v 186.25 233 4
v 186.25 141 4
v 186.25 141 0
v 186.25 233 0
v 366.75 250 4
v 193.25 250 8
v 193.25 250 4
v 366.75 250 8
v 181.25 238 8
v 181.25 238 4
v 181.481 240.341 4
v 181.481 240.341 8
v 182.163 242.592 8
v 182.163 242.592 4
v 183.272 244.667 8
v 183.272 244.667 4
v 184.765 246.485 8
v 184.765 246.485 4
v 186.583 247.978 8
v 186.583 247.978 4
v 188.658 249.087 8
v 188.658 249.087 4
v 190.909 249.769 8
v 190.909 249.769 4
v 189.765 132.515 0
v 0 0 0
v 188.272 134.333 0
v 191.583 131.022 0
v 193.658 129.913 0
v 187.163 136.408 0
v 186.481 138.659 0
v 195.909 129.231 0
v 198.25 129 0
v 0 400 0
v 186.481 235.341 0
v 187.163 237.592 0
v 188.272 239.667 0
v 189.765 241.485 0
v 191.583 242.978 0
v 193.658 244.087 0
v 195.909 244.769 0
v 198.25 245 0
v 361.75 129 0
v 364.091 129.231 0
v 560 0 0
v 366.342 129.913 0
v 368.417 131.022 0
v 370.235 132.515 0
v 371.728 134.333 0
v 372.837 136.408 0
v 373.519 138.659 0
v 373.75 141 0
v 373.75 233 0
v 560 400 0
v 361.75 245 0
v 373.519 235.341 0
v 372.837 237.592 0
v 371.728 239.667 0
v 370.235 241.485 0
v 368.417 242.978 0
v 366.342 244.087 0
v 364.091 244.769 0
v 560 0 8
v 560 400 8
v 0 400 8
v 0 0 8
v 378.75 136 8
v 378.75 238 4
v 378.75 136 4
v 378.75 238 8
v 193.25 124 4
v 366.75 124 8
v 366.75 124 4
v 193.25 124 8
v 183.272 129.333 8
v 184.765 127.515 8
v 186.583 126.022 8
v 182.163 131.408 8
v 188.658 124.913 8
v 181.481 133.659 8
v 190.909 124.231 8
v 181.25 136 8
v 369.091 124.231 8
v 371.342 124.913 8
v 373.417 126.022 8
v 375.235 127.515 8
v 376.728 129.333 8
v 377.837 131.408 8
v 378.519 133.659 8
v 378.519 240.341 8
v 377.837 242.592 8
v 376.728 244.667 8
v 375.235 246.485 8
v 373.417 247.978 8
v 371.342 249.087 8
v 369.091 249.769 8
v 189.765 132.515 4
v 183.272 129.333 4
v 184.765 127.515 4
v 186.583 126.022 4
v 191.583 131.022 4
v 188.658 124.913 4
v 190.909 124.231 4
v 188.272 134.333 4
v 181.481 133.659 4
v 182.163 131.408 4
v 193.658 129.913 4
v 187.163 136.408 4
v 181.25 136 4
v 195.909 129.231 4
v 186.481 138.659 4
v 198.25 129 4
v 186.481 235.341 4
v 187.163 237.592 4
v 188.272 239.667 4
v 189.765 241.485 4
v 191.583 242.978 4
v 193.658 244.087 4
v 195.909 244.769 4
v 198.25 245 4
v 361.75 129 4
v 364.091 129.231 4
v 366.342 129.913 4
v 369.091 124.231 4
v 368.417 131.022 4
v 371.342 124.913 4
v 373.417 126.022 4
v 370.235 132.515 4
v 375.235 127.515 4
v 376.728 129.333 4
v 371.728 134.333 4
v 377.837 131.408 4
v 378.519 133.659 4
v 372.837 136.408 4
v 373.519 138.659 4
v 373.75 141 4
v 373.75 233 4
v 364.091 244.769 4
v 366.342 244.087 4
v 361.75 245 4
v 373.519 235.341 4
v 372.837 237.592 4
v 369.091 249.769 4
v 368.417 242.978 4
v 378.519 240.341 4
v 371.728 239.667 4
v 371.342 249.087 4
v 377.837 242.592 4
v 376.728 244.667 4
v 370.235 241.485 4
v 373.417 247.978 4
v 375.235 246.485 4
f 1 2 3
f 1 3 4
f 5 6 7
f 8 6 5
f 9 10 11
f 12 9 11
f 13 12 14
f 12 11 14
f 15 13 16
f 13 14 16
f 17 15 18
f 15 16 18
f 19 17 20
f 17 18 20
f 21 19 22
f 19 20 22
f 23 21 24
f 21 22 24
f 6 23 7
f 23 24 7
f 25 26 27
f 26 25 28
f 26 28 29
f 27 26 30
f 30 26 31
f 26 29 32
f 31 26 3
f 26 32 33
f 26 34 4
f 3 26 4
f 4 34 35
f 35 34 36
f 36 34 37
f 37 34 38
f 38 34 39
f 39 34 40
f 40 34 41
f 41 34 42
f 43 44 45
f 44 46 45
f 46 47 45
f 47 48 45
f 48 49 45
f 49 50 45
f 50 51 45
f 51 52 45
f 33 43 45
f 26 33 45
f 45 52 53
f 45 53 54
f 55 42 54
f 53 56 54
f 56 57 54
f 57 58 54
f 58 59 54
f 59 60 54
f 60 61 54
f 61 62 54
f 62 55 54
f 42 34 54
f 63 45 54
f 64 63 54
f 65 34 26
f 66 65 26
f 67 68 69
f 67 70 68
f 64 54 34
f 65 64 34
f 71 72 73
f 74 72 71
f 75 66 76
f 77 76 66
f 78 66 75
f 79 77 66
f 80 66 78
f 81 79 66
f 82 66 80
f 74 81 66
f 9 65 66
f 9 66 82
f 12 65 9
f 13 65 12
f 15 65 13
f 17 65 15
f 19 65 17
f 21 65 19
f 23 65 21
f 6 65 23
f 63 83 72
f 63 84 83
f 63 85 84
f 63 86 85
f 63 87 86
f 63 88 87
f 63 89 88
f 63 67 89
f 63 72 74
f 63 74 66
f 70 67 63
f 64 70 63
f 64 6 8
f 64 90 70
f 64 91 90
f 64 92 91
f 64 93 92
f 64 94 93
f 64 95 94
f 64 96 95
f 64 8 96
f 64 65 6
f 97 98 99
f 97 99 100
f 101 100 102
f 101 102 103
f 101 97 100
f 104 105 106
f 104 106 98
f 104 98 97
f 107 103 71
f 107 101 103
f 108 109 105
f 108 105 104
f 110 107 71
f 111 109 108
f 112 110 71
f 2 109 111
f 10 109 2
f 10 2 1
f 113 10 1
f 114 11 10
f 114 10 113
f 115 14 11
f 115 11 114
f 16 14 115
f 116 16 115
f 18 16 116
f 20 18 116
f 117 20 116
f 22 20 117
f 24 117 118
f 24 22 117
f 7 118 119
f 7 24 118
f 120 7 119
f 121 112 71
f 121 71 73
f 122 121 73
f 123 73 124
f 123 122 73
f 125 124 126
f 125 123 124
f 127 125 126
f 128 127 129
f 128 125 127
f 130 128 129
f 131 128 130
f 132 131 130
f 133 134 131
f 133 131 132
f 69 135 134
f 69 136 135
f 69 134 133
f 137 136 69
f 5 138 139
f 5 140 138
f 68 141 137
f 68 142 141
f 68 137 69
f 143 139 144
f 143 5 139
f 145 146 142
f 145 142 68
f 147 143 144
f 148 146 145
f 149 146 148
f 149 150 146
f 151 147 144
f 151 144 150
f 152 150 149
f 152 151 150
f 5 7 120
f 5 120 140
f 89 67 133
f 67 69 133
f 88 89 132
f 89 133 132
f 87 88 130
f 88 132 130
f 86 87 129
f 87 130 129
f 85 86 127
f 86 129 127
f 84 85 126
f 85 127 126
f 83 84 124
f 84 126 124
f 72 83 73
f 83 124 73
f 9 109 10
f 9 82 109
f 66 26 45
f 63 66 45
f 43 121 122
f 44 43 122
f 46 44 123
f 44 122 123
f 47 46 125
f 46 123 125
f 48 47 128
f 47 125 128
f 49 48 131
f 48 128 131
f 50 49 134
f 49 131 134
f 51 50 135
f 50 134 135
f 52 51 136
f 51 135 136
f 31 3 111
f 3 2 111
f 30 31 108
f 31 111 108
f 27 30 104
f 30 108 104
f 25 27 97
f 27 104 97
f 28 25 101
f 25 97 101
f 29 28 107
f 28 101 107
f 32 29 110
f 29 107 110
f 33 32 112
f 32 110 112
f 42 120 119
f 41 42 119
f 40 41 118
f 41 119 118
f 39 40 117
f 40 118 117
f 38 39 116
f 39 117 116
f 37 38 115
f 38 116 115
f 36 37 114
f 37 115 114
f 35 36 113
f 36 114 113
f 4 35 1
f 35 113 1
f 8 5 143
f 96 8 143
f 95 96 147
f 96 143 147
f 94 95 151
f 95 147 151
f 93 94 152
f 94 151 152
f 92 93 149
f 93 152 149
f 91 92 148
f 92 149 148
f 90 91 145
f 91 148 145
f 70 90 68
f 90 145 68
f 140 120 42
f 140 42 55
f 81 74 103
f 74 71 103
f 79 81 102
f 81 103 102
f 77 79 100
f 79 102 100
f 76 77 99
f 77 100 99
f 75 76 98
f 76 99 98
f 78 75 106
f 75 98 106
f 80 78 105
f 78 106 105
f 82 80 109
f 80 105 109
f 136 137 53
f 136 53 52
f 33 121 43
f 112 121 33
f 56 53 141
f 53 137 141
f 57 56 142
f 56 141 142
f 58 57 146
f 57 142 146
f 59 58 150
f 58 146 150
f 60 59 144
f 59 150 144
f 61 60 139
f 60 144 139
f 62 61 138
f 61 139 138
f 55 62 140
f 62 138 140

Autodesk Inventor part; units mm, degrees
ref_plane "YZ Plane" through (0, 0, 0) normal (1, 0, 0) x (0, 1, 0)
ref_plane "XZ Plane" through (0, 0, 0) normal (0, 1, 0) x (-1, 0, 0)
ref_plane "XY Plane" through (0, 0, 0) normal (0, 0, 1) x (1, 0, 0)
sketch "Sketch1" plane through (0, 0, 0) normal (0, 0, 1) x (1, 0, 0)
  line L0 (0, 0) -> (560, 0)
  line L1 (560, 0) -> (560, 400)
  line L2 (560, 400) -> (0, 400)
  line L3 (0, 400) -> (0, 0)
  dimension "d0" = 560
  dimension "d1" = 400
extrude "Extrusion1" add sketch "Sketch1" along normal blind 8
sketch "Sketch2" plane through (0, 0, 8) normal (0, 0, 1) x (1, 0, 0)
  line L0 (181.25, 250) -> (378.75, 250)
  line L1 (378.75, 250) -> (378.75, 124)
  line L2 (378.75, 124) -> (181.25, 124)
  line L3 (181.25, 124) -> (181.25, 250)
  line L4 (0, 400) -> (0, 0) projected
  line L5 (560, 400) -> (0, 400) projected
  line L6 (186.25, 245) -> (373.75, 245)
  line L7 (373.75, 245) -> (373.75, 129)
  line L8 (373.75, 129) -> (186.25, 129)
  line L9 (186.25, 129) -> (186.25, 245)
  dimension "cuva_width" = 197.5
  dimension "d5" = 126
  dimension "d6" = 181.25
  dimension "d7" = 150
  dimension "d8" = 5
  dimension "d9" = 5
  dimension "d10" = 5
  dimension "d11" = 5
extrude "Extrusion2" cut sketch "Sketch2" against normal blind 4
fillet "Fillet1" radius 12 4 edges at (181.25, 250, 6) (181.25, 124, 6) (378.75, 124, 6) (378.75, 250, 6)
sketch "Sketch3" plane through (0, 0, 8) normal (0, 0, 1) x (1, 0, 0)
  line L0 (186.25, 245) -> (186.25, 129) projected
  line L1 (186.25, 129) -> (373.75, 129) projected
  line L2 (373.75, 129) -> (373.75, 245) projected
  line L3 (373.75, 245) -> (186.25, 245) projected
  point P0 (0, 0)
extrude "Extrusion3" cut sketch "Sketch3" against normal blind 4
sketch "Sketch4" plane through (0, 0, 4) normal (0, 0, 1) x (1, 0, 0)
  arc A0 (378.75, 238) -> (366.75, 250) centre (366.75, 238) ccw projected
  line L0 (193.25, 250) -> (366.75, 250) projected
  arc A1 (193.25, 250) -> (181.25, 238) centre (193.25, 238) ccw projected
  line L1 (181.25, 136) -> (181.25, 238) projected
  arc A2 (181.25, 136) -> (193.25, 124) centre (193.25, 136) ccw projected
  line L2 (366.75, 124) -> (193.25, 124) projected
  arc A3 (366.75, 124) -> (378.75, 136) centre (366.75, 136) ccw projected
  line L3 (378.75, 238) -> (378.75, 136) projected
  line L4 (198.25, 245) -> (361.75, 245)
  line L5 (373.75, 233) -> (373.75, 141)
  line L6 (361.75, 129) -> (198.25, 129)
  line L7 (186.25, 141) -> (186.25, 233)
  arc A4 (198.25, 245) -> (186.25, 233) centre (198.25, 233) ccw
  arc A5 (186.25, 141) -> (198.25, 129) centre (198.25, 141) ccw
  arc A6 (373.75, 233) -> (361.75, 245) centre (361.75, 233) ccw
  arc A7 (361.75, 129) -> (373.75, 141) centre (361.75, 141) ccw
  point P0 (0, 0)
  dimension "d17" = 5
  dimension "d18" = 5
  dimension "d19" = 5
  dimension "d20" = 5
  dimension "d21" = 12
extrude "Extrusion4" cut sketch "Sketch4" against normal through all contours L4 A6 L5 A7 L6 A5 L7 A4
equation "\"d9\" = d8"
equation "\"d10\" = d8"
equation "\"d11\" = d8"
equation "\"d18\" = d17"
equation "\"d19\" = d17"
equation "\"d20\" = d17"
properties part number "capac cu gaura 3"
